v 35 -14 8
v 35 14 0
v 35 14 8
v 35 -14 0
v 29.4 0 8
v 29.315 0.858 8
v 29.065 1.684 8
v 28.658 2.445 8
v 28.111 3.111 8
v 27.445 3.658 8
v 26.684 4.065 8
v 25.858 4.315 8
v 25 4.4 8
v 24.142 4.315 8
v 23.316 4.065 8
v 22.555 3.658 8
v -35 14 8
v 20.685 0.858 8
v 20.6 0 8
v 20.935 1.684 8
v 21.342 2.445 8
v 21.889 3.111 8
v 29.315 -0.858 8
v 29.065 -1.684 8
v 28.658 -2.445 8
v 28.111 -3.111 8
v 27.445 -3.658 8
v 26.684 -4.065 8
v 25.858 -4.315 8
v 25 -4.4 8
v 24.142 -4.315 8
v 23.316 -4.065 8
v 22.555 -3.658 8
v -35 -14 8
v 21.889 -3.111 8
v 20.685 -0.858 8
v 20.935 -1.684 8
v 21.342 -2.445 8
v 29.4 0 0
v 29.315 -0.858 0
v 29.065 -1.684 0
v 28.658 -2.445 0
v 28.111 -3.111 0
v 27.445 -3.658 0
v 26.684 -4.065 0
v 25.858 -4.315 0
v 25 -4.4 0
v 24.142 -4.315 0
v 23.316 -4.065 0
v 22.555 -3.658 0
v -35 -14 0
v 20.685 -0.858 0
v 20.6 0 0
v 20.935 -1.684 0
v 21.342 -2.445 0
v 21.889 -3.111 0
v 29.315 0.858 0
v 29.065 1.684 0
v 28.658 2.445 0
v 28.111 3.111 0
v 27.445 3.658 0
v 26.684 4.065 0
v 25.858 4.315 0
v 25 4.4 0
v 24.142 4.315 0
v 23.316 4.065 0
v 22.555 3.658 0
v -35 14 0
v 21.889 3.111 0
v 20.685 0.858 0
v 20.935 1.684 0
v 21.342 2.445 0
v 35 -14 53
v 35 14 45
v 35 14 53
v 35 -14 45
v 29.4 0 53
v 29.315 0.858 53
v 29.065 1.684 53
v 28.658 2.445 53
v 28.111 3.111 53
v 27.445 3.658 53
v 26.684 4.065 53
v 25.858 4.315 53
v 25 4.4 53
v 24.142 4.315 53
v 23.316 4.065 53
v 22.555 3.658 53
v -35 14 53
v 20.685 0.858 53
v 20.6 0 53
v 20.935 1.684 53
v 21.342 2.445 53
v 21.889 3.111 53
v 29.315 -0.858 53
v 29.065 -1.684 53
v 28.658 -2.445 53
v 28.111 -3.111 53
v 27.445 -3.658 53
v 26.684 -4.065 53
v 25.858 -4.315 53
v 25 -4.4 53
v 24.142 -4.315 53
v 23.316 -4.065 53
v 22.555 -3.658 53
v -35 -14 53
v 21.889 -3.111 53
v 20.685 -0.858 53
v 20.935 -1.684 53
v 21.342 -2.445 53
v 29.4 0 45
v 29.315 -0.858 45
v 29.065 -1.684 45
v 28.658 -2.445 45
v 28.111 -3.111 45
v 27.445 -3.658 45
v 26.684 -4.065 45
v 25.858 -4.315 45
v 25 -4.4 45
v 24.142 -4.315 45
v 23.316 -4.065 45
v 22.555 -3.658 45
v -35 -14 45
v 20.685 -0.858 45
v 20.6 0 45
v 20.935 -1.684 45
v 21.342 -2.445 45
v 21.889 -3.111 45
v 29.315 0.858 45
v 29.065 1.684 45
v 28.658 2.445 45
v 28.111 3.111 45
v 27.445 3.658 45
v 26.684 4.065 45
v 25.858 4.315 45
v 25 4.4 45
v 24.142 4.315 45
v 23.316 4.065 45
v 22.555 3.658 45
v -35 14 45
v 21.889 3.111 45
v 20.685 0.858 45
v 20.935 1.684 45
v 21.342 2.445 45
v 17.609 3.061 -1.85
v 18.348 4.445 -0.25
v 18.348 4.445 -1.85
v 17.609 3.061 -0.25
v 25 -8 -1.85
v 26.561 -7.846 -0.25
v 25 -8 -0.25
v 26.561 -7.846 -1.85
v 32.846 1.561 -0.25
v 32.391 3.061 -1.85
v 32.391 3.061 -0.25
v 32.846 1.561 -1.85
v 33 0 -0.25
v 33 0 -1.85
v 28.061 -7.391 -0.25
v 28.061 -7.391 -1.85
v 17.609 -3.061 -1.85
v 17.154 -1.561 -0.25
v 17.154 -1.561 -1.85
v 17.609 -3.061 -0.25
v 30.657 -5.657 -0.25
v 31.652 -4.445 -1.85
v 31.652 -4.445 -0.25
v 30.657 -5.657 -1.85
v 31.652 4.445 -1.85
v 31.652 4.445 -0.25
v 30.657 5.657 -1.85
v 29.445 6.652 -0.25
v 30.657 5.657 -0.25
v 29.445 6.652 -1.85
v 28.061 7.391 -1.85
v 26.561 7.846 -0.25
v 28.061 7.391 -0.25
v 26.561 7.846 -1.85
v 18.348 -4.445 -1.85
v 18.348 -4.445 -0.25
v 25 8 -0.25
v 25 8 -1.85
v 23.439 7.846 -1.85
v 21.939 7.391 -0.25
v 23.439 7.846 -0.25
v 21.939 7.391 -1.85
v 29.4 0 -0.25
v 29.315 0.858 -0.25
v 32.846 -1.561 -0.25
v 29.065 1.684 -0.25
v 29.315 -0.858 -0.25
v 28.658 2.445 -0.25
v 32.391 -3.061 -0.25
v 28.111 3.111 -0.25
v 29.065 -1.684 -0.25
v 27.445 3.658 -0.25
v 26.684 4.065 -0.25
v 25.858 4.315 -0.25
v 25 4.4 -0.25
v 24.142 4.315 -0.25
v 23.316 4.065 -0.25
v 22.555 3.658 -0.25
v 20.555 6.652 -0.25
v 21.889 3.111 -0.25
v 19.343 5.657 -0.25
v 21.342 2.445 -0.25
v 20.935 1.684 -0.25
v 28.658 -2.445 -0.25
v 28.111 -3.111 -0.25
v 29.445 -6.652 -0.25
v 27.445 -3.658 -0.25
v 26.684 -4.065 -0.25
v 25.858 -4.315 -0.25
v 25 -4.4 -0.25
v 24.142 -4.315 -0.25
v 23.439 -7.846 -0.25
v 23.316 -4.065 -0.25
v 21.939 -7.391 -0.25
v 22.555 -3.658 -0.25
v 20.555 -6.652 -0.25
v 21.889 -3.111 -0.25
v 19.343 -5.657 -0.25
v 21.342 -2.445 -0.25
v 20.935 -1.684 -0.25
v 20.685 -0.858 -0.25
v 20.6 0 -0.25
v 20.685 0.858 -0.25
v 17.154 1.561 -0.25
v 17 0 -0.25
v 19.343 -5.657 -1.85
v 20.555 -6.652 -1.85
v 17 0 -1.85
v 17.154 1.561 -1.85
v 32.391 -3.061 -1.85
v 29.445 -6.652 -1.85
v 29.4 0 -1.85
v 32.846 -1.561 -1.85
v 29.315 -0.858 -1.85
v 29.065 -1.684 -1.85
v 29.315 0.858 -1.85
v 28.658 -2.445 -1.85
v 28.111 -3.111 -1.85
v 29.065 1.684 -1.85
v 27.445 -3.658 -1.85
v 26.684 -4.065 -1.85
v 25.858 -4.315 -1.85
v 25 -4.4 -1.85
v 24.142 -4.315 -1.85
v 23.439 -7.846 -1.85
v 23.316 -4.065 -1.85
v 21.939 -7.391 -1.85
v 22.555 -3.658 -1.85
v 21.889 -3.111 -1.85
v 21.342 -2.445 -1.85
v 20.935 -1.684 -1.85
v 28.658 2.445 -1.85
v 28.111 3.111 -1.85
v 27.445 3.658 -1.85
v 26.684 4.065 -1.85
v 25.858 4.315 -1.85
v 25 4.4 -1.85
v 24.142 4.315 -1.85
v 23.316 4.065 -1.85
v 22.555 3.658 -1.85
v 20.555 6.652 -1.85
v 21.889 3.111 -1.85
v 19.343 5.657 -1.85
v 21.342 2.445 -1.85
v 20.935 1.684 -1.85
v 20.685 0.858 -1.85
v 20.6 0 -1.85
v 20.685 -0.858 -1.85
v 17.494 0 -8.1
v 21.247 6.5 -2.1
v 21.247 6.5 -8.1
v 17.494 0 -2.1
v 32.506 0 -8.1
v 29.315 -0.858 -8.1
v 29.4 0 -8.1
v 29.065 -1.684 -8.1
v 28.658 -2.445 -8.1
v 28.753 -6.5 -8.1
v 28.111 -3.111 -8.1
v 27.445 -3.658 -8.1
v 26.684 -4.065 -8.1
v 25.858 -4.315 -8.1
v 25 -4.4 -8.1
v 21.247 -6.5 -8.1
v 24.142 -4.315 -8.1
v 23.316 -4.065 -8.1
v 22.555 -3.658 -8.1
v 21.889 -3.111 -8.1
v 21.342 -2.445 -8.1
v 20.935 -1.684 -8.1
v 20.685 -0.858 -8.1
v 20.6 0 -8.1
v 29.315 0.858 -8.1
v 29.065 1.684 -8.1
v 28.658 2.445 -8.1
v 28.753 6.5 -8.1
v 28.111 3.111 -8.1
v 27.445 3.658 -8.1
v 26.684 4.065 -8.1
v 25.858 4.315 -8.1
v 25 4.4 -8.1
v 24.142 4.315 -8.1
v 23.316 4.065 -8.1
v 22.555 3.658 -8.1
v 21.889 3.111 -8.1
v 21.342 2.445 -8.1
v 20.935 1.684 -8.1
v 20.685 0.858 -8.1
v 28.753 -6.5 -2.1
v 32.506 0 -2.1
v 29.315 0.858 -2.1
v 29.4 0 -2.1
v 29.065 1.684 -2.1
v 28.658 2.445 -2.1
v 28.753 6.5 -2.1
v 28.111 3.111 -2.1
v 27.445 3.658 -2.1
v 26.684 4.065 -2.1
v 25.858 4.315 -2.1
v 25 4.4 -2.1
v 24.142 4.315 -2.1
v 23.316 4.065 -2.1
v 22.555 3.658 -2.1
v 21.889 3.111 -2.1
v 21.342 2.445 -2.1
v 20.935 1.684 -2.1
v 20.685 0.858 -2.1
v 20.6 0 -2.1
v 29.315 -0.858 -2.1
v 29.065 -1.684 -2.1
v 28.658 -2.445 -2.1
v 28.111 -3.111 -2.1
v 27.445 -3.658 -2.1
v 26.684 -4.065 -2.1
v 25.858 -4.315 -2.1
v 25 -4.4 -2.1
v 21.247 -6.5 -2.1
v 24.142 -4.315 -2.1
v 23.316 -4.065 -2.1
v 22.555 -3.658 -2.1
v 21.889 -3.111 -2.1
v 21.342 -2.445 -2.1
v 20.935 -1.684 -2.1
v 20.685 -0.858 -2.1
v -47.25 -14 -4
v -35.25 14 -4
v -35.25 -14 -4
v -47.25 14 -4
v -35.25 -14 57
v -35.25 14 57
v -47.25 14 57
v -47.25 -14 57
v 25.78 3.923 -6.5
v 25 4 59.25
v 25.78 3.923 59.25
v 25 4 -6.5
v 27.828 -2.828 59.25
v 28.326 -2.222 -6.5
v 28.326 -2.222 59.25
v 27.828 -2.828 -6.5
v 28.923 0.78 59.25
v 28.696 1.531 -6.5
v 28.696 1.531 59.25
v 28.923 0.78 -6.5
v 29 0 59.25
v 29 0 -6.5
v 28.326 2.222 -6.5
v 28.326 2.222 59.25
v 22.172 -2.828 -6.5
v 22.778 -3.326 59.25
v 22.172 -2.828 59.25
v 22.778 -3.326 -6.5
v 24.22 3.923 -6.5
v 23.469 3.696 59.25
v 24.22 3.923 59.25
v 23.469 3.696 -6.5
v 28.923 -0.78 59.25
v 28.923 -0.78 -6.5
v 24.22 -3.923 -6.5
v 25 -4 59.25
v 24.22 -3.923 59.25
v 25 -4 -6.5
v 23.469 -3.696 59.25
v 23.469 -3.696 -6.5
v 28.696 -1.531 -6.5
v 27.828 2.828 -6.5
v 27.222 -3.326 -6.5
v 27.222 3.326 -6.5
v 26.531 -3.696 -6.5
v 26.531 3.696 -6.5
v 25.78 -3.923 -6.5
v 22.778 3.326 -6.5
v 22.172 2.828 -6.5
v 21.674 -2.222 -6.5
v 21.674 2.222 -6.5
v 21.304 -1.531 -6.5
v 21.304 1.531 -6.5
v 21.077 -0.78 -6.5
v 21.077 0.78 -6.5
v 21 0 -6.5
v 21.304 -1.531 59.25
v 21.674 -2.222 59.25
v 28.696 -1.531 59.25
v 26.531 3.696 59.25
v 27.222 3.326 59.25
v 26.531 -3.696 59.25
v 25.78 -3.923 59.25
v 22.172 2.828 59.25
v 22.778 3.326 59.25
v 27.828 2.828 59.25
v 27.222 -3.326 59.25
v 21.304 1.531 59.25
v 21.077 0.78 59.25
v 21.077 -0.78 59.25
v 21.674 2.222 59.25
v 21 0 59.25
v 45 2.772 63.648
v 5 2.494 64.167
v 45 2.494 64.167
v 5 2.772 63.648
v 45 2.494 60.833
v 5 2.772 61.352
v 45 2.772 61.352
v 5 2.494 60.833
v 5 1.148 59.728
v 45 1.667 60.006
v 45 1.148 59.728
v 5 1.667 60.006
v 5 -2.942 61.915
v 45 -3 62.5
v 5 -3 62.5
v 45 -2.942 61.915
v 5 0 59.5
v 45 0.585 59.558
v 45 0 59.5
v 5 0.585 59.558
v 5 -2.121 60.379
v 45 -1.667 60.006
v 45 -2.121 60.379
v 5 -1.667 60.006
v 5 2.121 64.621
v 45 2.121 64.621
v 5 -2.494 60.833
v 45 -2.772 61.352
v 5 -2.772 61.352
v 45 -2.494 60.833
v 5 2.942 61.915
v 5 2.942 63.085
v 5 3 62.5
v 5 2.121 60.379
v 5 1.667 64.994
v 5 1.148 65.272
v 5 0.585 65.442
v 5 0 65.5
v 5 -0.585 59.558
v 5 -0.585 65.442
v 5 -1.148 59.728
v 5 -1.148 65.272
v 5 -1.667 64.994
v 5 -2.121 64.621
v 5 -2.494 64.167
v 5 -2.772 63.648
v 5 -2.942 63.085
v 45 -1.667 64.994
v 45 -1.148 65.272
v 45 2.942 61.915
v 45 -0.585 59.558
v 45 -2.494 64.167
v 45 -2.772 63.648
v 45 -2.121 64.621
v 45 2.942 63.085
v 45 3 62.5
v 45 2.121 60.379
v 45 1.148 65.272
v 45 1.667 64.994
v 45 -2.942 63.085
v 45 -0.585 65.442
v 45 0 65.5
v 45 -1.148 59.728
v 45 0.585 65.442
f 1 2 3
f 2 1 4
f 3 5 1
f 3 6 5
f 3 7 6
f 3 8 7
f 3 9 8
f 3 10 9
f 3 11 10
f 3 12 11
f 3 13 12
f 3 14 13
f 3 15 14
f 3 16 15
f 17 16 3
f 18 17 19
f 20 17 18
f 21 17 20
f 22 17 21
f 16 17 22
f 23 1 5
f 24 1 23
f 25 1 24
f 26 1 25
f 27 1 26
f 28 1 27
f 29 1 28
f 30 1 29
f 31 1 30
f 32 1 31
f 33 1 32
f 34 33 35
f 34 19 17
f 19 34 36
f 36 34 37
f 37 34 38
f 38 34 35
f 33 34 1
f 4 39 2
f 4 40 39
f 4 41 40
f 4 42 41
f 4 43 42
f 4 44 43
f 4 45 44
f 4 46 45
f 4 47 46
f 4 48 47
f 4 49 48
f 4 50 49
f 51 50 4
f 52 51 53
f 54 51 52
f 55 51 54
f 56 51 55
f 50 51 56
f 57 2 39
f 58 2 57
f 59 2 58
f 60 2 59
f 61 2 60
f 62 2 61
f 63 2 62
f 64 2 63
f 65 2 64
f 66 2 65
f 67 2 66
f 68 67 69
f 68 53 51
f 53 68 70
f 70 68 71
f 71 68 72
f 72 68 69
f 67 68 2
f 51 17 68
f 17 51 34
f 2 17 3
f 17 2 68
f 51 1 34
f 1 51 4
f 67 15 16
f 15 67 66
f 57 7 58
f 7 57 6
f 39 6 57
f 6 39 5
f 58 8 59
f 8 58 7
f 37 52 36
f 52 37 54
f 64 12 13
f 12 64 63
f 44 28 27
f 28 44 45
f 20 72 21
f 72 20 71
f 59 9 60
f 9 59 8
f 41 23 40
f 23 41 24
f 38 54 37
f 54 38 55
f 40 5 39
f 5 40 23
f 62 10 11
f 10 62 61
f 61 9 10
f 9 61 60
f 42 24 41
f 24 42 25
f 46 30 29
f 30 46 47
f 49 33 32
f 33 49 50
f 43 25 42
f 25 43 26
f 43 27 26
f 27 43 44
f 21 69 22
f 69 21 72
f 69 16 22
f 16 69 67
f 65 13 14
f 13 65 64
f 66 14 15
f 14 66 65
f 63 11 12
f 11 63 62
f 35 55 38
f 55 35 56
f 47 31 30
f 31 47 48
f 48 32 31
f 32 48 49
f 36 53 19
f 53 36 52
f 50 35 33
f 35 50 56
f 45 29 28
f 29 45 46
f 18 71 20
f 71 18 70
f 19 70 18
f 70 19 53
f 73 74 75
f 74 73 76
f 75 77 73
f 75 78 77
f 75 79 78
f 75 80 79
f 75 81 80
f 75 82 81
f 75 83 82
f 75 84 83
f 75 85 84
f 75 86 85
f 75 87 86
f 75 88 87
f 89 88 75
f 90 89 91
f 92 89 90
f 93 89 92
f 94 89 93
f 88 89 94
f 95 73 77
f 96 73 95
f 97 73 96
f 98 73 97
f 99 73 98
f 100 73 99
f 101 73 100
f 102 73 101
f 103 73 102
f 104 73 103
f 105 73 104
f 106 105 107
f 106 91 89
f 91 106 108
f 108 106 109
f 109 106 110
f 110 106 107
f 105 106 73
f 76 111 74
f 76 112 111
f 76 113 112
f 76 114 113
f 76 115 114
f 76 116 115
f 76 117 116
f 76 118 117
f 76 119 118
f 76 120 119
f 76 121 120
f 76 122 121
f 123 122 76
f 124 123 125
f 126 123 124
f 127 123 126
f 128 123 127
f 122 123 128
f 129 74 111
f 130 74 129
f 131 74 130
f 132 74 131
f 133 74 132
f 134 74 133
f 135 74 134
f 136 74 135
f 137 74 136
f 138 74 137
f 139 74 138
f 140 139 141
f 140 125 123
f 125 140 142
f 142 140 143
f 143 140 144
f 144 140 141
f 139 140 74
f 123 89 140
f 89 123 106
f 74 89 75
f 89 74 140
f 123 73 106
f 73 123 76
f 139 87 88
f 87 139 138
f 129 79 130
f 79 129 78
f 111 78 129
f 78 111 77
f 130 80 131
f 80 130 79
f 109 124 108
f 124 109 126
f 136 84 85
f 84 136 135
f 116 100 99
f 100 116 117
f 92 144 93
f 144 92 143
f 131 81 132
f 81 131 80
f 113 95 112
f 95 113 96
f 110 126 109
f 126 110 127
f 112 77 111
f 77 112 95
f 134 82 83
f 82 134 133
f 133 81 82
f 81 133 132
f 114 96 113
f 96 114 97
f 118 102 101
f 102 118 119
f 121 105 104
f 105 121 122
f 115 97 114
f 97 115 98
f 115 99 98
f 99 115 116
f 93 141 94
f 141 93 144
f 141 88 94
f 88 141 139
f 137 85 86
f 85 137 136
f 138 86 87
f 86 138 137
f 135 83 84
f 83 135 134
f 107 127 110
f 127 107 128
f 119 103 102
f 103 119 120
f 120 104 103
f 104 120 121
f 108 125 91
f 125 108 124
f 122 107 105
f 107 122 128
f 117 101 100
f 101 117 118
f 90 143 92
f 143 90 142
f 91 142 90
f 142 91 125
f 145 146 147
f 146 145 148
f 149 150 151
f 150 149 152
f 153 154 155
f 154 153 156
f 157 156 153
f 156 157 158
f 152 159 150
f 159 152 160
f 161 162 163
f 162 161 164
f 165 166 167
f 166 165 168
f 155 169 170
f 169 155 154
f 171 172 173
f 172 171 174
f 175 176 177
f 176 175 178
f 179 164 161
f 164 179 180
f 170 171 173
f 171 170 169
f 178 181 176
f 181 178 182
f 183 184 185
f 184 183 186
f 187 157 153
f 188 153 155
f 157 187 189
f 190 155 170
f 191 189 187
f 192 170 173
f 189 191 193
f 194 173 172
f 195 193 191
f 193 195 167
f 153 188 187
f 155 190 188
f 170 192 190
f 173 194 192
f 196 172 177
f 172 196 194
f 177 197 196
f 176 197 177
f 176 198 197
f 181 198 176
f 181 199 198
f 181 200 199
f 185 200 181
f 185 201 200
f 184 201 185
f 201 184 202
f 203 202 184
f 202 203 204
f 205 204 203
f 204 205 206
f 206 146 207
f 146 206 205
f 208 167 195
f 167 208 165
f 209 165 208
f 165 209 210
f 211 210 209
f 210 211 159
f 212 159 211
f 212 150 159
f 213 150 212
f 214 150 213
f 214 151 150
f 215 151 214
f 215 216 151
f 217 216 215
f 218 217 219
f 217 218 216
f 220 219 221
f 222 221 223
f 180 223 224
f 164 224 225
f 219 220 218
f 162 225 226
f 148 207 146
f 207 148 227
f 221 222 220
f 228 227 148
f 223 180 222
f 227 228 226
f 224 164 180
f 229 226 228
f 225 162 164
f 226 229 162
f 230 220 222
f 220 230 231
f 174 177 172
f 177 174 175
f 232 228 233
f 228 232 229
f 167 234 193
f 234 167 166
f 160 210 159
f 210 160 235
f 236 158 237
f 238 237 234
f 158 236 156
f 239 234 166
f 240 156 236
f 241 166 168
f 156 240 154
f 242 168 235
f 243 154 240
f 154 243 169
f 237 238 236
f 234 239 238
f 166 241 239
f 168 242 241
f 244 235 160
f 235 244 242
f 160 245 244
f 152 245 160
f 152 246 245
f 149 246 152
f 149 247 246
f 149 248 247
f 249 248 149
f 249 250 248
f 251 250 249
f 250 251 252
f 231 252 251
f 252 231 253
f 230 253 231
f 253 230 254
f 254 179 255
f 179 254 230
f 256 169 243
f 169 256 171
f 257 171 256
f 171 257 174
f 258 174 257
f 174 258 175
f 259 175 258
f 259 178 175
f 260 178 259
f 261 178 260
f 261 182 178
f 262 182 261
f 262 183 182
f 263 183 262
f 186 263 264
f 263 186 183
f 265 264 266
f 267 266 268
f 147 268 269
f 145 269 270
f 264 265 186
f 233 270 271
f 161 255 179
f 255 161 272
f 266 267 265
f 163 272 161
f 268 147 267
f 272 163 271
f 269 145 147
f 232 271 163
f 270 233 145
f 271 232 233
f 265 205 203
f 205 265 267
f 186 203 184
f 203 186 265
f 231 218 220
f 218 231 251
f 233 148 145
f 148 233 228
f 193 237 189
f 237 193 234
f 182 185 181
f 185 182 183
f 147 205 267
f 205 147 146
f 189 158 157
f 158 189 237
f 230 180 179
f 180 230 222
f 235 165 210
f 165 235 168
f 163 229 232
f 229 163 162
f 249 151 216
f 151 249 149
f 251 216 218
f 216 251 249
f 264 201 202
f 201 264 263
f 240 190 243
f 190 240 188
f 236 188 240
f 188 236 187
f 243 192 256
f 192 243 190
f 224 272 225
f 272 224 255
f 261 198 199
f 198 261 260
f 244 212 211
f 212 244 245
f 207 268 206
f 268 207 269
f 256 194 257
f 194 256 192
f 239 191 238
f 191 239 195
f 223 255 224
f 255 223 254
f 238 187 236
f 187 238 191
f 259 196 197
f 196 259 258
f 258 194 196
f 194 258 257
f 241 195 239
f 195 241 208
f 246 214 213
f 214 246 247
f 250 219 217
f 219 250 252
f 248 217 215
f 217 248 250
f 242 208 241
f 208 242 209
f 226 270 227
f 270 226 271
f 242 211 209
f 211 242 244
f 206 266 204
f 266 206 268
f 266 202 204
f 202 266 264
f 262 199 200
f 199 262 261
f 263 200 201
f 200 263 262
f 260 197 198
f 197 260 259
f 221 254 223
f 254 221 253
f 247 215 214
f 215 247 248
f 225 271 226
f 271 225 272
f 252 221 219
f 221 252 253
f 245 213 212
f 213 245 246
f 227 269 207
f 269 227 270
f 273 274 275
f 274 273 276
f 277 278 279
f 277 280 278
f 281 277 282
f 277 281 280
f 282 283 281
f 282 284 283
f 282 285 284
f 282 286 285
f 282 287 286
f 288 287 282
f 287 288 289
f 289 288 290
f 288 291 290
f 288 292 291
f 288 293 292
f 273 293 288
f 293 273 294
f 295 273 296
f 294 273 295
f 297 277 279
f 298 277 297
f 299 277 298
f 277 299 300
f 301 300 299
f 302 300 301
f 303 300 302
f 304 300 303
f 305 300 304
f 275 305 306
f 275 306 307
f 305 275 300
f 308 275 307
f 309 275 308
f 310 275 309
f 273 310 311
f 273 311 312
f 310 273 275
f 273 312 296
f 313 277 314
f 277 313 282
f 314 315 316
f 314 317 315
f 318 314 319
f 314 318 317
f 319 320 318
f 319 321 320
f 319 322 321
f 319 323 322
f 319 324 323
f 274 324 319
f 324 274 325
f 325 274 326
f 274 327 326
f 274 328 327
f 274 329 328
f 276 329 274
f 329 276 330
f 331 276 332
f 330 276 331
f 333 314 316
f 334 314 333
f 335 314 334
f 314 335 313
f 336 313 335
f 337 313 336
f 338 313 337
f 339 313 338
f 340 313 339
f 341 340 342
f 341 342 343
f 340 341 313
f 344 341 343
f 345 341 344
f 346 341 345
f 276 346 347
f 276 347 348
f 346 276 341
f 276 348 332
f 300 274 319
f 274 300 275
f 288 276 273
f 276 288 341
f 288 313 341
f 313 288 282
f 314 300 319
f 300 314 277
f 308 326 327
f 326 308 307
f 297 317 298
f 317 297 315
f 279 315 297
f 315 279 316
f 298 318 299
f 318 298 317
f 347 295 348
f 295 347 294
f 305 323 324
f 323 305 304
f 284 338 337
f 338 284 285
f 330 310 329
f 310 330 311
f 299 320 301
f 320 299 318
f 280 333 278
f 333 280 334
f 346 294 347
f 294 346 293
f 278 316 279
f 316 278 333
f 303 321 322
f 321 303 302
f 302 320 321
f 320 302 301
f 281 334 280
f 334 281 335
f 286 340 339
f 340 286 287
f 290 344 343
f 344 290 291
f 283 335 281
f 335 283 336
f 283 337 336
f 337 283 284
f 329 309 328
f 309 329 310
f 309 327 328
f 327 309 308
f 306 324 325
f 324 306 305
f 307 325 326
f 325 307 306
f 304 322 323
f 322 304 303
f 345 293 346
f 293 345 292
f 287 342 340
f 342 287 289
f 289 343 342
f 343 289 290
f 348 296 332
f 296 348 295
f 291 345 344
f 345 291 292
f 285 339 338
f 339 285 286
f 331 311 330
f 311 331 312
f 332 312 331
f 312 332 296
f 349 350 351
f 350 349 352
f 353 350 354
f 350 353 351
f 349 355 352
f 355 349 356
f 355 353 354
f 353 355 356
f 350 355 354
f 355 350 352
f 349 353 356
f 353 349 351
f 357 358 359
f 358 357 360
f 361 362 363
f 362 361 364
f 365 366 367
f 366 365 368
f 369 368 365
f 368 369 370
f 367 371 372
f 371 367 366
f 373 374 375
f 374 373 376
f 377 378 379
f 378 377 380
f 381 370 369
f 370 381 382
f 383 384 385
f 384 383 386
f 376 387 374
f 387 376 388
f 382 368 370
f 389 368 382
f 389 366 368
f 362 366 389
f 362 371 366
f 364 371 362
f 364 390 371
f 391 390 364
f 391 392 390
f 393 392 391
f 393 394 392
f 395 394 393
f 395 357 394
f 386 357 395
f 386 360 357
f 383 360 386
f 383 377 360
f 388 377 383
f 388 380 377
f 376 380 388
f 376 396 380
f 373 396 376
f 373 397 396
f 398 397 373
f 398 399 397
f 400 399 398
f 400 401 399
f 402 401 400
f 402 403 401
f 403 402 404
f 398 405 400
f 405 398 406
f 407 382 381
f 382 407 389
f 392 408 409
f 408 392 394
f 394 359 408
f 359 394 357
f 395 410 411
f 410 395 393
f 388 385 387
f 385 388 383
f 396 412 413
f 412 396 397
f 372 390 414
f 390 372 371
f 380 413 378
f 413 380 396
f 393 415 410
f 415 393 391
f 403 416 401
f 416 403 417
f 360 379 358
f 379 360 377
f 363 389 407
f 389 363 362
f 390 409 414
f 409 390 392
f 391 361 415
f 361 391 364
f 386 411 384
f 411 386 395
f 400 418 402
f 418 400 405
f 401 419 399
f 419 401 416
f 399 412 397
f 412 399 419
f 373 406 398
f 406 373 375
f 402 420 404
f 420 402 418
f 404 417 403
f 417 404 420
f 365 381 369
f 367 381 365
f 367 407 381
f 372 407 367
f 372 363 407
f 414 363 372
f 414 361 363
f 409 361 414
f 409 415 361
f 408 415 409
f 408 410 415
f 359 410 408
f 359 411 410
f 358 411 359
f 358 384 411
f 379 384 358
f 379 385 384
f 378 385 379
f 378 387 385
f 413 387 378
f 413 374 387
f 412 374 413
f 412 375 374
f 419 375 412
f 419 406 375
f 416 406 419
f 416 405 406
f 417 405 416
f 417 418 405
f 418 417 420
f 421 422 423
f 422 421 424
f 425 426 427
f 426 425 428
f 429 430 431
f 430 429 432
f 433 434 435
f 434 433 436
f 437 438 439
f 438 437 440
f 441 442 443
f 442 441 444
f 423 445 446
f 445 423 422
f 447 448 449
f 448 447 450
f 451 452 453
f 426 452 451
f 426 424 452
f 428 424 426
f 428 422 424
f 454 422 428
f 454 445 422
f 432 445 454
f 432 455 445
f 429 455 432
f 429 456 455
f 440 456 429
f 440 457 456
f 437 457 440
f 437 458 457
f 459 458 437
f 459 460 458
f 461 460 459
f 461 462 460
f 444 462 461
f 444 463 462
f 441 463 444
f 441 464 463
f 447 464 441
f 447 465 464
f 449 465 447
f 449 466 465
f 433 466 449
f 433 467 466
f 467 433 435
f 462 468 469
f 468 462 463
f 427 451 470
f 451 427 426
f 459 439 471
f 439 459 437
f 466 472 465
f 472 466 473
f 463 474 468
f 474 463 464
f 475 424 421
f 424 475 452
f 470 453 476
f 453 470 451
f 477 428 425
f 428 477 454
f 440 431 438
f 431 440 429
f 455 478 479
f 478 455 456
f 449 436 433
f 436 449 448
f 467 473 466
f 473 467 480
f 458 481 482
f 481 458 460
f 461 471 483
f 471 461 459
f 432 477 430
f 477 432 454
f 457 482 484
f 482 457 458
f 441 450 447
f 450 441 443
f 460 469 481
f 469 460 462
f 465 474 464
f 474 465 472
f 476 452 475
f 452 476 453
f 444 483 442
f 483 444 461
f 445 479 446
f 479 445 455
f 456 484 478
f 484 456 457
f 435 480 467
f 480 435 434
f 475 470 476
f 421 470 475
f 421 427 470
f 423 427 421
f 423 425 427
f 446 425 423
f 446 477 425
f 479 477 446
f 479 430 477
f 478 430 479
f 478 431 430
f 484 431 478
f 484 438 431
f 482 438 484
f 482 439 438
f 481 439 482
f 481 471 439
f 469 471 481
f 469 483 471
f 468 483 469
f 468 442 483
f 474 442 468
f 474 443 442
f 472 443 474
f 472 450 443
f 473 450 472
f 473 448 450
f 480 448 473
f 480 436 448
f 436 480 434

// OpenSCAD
$fn = 32;

// ------------------------------------------------------------------------
// C clamp: throat 45 mm, screw d8
// Every part is its own module, assembly() places every instance.
// ------------------------------------------------------------------------

// --- part 1 ---
module clamp_arm() {
  difference() {
    translate([-35, -14, 0]) cube([70, 28, 8]);
    translate([25, 0, -1]) cylinder(h = 10, d = 8.8);
  }
}

// --- part 2 ---
module clamp_spine() {
  difference() {
    translate([-30.5, -14, 0]) cube([61, 28, 12]);
  }
}

// --- part 3 ---
module clamp_screw() {
  translate([0, 0, -32.875]) cylinder(h = 65.75, d = 8);
}

// --- part 4 ---
module clamp_washer() {
  difference() {
      translate([0, 0, 0]) cylinder(h = 1.6, d = 16);
      translate([0, 0, -1]) cylinder(h = 3.6, d = 8.8);
    }
}

// --- part 5 ---
module clamp_nut() {
  difference() {
    linear_extrude(height = 6) polygon(points = [[7.506, 0], [3.753, 6.5], [-3.753, 6.5], [-7.506, 0], [-3.753, -6.5], [3.753, -6.5]]);
    translate([0, 0, -1]) cylinder(h = 8, d = 8.8);
  }
}

// --- part 6 ---
module tommy_bar() {
  translate([0, 0, -20]) cylinder(h = 40, d = 6);
}

// --- assembly ---
module assembly() {
  color([0.80, 0.24, 0.20]) translate([0, 0, 0]) rotate([0, 0, 0]) clamp_arm();
  color([0.20, 0.45, 0.75]) translate([0, 0, 45]) rotate([0, 0, 0]) clamp_arm();
  color([0.25, 0.62, 0.32]) translate([-47.25, 0, 26.5]) rotate([0, 90, 0]) clamp_spine();
  color([0.92, 0.70, 0.18]) translate([25, 0, 26.375]) rotate([0, 0, 0]) clamp_screw();
  color([0.58, 0.35, 0.70]) translate([25, 0, -1.85]) rotate([0, 0, 0]) clamp_washer();
  color([0.16, 0.66, 0.66]) translate([25, 0, -8.1]) rotate([0, 0, 0]) clamp_nut();
  color([0.85, 0.48, 0.18]) translate([25, 0, 62.5]) rotate([0, 90, 0]) tommy_bar();
}

assembly();
